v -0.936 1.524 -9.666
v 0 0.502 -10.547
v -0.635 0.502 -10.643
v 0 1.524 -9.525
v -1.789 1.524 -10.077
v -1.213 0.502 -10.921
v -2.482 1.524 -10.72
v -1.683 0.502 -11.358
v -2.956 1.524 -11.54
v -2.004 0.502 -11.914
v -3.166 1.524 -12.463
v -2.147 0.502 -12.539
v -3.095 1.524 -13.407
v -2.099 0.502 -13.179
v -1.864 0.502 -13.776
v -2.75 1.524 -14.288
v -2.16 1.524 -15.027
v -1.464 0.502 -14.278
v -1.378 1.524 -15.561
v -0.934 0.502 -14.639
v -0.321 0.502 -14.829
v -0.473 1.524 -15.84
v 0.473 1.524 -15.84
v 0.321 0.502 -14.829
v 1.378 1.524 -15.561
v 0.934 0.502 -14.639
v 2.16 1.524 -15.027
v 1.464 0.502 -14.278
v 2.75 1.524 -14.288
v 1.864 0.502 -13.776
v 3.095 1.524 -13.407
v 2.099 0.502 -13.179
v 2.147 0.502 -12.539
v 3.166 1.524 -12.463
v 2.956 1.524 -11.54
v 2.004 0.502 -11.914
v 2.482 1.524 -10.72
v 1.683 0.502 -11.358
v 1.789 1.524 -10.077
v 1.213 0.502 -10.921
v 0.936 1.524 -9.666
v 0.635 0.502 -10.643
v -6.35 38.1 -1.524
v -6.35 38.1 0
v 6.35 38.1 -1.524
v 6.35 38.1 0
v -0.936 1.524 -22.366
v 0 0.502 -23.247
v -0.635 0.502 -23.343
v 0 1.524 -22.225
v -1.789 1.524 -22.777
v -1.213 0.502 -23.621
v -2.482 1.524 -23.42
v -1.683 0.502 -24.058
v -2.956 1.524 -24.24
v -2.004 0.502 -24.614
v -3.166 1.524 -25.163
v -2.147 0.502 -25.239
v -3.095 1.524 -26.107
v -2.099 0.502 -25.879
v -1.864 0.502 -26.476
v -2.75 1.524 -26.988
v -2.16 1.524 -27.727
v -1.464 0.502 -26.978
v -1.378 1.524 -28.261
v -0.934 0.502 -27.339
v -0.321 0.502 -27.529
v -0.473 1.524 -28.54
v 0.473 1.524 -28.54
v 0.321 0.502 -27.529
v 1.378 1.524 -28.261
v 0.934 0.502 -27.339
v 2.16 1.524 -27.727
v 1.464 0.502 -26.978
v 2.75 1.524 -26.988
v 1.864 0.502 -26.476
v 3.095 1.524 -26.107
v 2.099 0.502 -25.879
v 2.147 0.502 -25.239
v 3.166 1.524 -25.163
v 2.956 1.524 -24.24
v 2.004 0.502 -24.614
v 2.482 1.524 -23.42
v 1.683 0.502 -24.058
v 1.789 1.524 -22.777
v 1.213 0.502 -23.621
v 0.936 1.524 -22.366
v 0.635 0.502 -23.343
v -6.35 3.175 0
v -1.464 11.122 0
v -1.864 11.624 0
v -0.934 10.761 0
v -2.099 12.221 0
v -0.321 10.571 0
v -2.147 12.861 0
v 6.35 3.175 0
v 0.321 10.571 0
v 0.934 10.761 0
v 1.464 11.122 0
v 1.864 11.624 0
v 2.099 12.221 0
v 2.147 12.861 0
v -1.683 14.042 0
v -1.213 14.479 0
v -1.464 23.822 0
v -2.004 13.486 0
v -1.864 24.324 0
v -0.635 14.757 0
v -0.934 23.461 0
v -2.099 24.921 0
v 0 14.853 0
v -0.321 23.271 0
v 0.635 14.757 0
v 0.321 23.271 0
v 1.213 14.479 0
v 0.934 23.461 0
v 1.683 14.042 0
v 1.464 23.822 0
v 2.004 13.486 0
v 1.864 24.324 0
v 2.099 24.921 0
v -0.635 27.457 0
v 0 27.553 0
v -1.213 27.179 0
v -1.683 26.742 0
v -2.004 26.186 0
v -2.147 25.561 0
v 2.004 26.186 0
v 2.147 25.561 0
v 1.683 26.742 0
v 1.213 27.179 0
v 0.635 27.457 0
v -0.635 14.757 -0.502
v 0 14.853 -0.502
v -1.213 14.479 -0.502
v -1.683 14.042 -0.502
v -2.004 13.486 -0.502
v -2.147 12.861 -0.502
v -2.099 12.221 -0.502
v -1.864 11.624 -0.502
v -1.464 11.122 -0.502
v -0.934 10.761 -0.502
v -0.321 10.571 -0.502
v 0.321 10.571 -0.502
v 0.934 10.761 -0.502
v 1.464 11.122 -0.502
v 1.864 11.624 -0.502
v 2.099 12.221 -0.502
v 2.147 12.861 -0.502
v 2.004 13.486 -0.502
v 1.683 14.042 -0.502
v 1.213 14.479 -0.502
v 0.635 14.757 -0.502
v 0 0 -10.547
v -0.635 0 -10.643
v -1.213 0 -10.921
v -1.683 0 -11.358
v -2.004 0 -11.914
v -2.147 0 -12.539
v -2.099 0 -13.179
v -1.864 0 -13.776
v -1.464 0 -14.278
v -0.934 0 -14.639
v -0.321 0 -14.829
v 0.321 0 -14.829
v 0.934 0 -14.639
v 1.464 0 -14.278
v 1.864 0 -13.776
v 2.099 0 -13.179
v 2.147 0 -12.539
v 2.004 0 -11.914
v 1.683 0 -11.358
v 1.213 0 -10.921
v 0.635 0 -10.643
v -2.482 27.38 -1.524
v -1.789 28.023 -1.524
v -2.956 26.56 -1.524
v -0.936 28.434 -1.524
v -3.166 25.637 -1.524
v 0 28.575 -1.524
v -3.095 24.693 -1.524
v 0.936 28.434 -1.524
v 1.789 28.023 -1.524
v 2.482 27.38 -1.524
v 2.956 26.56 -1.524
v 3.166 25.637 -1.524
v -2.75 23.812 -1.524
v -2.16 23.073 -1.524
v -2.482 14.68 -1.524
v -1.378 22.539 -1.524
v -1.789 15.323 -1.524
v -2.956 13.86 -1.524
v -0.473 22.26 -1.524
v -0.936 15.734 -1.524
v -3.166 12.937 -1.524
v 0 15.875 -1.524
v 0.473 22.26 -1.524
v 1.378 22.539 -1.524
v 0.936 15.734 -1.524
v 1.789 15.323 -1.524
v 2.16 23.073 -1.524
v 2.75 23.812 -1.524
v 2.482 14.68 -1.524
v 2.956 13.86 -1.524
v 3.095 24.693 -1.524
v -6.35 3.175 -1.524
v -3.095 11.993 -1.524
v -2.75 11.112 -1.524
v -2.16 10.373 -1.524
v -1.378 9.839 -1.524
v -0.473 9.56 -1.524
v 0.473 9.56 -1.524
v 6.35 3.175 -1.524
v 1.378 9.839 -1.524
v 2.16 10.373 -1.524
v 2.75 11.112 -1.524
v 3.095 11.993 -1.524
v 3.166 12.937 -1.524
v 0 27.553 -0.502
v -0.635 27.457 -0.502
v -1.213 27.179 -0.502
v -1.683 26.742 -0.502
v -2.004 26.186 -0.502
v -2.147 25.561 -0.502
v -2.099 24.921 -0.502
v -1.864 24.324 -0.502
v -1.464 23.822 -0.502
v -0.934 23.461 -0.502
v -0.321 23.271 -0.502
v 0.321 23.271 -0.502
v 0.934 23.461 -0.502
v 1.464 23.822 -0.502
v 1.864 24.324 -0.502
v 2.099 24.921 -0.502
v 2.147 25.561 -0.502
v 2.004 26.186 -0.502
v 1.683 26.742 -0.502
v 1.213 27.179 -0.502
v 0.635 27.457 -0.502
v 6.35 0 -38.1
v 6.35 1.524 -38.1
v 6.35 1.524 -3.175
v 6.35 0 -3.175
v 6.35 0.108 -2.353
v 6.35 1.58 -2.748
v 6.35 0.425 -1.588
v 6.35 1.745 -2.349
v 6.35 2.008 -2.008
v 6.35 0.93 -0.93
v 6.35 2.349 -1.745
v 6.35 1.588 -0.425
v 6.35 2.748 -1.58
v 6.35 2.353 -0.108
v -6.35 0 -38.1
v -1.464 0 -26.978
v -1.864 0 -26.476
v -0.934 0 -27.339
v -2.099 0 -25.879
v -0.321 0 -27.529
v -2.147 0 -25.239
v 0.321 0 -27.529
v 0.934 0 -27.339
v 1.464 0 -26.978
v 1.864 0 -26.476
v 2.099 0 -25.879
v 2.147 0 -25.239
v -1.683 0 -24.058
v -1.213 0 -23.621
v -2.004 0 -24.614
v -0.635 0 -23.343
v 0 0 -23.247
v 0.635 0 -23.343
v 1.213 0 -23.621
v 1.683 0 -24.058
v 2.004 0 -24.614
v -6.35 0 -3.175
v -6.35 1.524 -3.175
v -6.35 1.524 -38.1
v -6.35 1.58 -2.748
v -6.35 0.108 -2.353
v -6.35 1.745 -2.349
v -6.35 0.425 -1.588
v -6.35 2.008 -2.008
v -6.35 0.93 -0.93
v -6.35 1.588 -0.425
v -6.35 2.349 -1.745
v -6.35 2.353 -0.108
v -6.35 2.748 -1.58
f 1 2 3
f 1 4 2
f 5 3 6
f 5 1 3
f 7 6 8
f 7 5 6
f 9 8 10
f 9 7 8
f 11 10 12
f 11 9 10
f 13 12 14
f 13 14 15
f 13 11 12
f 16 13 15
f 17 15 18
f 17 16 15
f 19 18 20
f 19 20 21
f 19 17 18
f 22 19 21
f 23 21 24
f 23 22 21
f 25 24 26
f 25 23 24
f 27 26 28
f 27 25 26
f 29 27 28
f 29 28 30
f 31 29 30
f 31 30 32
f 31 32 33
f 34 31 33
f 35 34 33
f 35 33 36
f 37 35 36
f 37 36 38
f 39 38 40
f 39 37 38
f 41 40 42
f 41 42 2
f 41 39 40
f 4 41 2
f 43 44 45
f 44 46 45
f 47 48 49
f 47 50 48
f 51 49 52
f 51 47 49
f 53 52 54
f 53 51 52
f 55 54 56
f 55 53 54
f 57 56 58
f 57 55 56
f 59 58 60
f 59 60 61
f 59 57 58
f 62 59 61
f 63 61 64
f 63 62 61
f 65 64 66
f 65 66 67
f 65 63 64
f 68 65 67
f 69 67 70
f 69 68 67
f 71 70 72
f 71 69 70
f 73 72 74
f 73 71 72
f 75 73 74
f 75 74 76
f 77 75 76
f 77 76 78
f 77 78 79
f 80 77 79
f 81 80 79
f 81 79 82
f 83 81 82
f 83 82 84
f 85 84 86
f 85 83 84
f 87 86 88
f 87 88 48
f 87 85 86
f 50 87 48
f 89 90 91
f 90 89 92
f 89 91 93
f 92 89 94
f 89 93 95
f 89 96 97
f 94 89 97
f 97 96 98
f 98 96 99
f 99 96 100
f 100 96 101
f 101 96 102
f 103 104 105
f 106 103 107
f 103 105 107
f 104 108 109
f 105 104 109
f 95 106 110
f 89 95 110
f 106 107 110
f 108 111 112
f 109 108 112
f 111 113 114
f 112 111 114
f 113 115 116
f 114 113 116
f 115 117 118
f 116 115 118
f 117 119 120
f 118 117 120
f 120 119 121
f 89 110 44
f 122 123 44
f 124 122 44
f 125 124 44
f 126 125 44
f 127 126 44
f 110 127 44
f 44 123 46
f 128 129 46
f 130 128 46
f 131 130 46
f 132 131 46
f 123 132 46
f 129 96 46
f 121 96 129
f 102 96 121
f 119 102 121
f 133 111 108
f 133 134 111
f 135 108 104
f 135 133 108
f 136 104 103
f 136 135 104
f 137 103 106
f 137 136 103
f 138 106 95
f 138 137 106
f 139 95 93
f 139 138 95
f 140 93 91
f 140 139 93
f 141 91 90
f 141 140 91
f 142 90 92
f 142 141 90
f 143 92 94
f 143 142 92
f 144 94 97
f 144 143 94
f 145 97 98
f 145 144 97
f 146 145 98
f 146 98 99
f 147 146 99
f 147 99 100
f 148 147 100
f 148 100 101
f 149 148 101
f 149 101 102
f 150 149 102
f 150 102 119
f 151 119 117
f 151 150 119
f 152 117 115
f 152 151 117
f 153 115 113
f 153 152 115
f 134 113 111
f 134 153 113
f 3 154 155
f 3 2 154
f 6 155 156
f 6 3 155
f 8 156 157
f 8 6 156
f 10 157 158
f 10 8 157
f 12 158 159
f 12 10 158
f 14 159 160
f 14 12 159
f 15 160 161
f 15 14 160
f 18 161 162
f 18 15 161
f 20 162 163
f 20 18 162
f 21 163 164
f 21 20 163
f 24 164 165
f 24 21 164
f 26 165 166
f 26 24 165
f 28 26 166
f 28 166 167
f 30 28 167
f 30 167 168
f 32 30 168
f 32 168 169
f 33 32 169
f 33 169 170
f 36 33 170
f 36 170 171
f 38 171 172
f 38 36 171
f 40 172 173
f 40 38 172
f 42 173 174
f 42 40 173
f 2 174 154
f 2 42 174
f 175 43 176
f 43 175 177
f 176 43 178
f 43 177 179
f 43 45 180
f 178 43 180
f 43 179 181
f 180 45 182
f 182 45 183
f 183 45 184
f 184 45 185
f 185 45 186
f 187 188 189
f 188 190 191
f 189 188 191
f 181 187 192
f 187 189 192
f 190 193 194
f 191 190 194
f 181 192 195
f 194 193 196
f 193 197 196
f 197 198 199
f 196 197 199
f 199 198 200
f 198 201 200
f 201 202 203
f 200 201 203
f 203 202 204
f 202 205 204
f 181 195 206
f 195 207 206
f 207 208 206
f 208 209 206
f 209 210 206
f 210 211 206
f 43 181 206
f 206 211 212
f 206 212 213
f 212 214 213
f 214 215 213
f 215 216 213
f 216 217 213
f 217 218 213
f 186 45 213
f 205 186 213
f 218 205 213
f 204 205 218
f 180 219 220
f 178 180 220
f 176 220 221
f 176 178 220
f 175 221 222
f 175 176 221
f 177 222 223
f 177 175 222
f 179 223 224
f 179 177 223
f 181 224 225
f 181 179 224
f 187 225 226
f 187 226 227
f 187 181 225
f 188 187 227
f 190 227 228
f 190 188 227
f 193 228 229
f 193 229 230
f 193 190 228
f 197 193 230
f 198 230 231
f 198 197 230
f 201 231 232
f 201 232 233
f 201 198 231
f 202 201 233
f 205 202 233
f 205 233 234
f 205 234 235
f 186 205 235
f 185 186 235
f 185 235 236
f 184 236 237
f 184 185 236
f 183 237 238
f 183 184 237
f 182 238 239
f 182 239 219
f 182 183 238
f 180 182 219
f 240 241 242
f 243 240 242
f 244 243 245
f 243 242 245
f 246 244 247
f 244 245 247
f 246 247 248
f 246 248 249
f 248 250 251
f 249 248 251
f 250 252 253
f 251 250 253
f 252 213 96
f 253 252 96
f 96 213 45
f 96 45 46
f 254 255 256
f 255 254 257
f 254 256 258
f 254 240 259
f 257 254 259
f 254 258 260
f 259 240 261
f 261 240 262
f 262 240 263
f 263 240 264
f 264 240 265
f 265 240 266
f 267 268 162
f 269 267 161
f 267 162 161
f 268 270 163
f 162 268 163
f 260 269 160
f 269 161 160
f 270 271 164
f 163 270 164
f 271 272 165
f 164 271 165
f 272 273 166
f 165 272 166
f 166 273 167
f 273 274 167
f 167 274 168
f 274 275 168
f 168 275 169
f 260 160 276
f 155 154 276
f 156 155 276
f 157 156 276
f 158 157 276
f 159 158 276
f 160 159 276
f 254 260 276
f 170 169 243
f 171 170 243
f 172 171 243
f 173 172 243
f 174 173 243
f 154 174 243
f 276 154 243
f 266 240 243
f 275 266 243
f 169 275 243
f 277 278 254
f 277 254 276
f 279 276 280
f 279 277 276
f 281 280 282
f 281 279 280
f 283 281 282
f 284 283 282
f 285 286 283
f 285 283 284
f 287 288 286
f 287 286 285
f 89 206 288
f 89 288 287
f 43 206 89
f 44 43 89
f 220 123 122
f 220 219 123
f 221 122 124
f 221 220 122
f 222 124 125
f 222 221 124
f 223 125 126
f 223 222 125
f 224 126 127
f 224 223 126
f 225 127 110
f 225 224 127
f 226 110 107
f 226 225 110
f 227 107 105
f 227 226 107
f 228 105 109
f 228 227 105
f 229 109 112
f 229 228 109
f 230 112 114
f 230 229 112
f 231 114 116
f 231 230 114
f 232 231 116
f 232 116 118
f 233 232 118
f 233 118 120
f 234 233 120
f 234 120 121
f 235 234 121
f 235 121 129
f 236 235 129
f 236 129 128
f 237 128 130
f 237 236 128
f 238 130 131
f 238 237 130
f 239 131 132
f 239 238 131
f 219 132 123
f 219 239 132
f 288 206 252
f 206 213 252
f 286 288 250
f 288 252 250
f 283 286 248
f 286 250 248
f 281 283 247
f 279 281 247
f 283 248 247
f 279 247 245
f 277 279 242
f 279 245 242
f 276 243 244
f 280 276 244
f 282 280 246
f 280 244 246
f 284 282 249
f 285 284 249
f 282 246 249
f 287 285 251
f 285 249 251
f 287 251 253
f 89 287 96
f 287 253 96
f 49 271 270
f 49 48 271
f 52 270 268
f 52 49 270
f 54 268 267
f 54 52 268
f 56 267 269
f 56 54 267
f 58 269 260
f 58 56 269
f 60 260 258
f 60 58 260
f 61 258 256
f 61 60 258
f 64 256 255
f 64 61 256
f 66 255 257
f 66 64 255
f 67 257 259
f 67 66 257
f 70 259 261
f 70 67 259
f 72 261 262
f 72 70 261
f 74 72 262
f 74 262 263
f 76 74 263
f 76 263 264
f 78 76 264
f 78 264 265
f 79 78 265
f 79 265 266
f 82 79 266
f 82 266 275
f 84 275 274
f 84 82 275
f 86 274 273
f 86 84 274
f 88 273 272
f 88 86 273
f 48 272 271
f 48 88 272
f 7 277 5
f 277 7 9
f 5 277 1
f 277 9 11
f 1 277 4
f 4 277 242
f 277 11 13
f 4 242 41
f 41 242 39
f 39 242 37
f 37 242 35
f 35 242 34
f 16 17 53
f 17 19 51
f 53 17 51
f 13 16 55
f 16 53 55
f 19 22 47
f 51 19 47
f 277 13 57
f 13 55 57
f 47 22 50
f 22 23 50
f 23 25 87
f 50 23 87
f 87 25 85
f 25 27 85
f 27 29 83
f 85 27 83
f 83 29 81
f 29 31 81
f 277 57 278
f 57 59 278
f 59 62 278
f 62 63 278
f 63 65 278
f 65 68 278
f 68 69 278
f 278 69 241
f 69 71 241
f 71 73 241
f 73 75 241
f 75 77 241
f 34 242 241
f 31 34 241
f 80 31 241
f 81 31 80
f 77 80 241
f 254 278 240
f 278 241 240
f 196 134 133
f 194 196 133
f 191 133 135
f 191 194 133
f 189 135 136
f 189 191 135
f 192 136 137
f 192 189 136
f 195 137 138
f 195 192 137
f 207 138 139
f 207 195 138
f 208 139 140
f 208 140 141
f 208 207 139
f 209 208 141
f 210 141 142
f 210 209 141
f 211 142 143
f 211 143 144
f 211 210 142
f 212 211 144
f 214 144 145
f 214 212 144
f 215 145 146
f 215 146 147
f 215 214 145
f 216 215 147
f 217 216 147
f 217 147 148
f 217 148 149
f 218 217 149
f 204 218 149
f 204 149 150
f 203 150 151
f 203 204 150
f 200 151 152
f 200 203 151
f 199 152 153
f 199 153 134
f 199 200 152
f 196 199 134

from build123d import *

# Parameters (mm, degrees)
BOSS_EXTRUDE1_DEPTH            = 6.35
F_6_CLEARANCE_HOLE1_AT_2_COUNT = 2
F_6_CLEARANCE_HOLE1_AT_2_PITCH = 12.7
F_6_CLEARANCE_HOLE2_AT_2_COUNT = 2
F_6_CLEARANCE_HOLE2_AT_2_PITCH = 12.7


with BuildPart() as part:
    # Sketch1 → Boss-Extrude1 (new, symmetric)
    with BuildSketch(Plane(origin=(0, 0, 0), x_dir=(0, 0, -1), z_dir=(1, 0, 0))):
        with BuildLine():
            Line((0, 3.175), (0, 38.1))
            Line((0, 38.1), (1.524, 38.1))
            Line((1.524, 38.1), (1.524, 3.175))
            ThreePointArc((1.524, 3.175), (2.007566704, 2.007566704), (3.175, 1.524))
            Line((3.175, 1.524), (38.1, 1.524))
            Line((38.1, 1.524), (38.1, 0))
            Line((38.1, 0), (3.175, 0))
            ThreePointArc((3.175, 0), (0.92993597, 0.92993597), (0, 3.175))
        make_face()
    extrude(amount=BOSS_EXTRUDE1_DEPTH, both=True)

    # Sketch3 → #6 Clearance Hole1 (revolve, cut)
    with BuildSketch(Plane(origin=(0, 1.524, -25.4), x_dir=(0, 0, 1), z_dir=(1, 0, 0))):
        Polygon((0, 0), (0, 1.524), (2.15265, 1.524), (2.15265, 1.02235), (3.175, 0), align=None)
    f_6_clearance_hole1 = revolve(axis=Axis((0, 7.874, -25.4), (0, -1, 0)), mode=Mode.SUBTRACT)

    # #6 Clearance Hole1 at 2: #6 Clearance Hole1 ×2
    with Locations(*[(0, 0, i * F_6_CLEARANCE_HOLE1_AT_2_PITCH) for i in range(1, F_6_CLEARANCE_HOLE1_AT_2_COUNT)]):
        add(f_6_clearance_hole1, mode=Mode.SUBTRACT)

    # Sketch6 → #6 Clearance Hole2 (revolve, cut)
    with BuildSketch(Plane(origin=(0, 12.7, -1.524), x_dir=(0, 1, 0), z_dir=(1, 0, 0))):
        Polygon((0, 0), (0, 1.524), (2.15265, 1.524), (2.15265, 1.02235), (3.175, 0), align=None)
    f_6_clearance_hole2 = revolve(axis=Axis((0, 12.7, -7.874), (0, 0, 1)), mode=Mode.SUBTRACT)

    # #6 Clearance Hole2 at 2: #6 Clearance Hole2 ×2
    with Locations(*[(0, i * F_6_CLEARANCE_HOLE2_AT_2_PITCH, 0) for i in range(1, F_6_CLEARANCE_HOLE2_AT_2_COUNT)]):
        add(f_6_clearance_hole2, mode=Mode.SUBTRACT)


solid = part.part
